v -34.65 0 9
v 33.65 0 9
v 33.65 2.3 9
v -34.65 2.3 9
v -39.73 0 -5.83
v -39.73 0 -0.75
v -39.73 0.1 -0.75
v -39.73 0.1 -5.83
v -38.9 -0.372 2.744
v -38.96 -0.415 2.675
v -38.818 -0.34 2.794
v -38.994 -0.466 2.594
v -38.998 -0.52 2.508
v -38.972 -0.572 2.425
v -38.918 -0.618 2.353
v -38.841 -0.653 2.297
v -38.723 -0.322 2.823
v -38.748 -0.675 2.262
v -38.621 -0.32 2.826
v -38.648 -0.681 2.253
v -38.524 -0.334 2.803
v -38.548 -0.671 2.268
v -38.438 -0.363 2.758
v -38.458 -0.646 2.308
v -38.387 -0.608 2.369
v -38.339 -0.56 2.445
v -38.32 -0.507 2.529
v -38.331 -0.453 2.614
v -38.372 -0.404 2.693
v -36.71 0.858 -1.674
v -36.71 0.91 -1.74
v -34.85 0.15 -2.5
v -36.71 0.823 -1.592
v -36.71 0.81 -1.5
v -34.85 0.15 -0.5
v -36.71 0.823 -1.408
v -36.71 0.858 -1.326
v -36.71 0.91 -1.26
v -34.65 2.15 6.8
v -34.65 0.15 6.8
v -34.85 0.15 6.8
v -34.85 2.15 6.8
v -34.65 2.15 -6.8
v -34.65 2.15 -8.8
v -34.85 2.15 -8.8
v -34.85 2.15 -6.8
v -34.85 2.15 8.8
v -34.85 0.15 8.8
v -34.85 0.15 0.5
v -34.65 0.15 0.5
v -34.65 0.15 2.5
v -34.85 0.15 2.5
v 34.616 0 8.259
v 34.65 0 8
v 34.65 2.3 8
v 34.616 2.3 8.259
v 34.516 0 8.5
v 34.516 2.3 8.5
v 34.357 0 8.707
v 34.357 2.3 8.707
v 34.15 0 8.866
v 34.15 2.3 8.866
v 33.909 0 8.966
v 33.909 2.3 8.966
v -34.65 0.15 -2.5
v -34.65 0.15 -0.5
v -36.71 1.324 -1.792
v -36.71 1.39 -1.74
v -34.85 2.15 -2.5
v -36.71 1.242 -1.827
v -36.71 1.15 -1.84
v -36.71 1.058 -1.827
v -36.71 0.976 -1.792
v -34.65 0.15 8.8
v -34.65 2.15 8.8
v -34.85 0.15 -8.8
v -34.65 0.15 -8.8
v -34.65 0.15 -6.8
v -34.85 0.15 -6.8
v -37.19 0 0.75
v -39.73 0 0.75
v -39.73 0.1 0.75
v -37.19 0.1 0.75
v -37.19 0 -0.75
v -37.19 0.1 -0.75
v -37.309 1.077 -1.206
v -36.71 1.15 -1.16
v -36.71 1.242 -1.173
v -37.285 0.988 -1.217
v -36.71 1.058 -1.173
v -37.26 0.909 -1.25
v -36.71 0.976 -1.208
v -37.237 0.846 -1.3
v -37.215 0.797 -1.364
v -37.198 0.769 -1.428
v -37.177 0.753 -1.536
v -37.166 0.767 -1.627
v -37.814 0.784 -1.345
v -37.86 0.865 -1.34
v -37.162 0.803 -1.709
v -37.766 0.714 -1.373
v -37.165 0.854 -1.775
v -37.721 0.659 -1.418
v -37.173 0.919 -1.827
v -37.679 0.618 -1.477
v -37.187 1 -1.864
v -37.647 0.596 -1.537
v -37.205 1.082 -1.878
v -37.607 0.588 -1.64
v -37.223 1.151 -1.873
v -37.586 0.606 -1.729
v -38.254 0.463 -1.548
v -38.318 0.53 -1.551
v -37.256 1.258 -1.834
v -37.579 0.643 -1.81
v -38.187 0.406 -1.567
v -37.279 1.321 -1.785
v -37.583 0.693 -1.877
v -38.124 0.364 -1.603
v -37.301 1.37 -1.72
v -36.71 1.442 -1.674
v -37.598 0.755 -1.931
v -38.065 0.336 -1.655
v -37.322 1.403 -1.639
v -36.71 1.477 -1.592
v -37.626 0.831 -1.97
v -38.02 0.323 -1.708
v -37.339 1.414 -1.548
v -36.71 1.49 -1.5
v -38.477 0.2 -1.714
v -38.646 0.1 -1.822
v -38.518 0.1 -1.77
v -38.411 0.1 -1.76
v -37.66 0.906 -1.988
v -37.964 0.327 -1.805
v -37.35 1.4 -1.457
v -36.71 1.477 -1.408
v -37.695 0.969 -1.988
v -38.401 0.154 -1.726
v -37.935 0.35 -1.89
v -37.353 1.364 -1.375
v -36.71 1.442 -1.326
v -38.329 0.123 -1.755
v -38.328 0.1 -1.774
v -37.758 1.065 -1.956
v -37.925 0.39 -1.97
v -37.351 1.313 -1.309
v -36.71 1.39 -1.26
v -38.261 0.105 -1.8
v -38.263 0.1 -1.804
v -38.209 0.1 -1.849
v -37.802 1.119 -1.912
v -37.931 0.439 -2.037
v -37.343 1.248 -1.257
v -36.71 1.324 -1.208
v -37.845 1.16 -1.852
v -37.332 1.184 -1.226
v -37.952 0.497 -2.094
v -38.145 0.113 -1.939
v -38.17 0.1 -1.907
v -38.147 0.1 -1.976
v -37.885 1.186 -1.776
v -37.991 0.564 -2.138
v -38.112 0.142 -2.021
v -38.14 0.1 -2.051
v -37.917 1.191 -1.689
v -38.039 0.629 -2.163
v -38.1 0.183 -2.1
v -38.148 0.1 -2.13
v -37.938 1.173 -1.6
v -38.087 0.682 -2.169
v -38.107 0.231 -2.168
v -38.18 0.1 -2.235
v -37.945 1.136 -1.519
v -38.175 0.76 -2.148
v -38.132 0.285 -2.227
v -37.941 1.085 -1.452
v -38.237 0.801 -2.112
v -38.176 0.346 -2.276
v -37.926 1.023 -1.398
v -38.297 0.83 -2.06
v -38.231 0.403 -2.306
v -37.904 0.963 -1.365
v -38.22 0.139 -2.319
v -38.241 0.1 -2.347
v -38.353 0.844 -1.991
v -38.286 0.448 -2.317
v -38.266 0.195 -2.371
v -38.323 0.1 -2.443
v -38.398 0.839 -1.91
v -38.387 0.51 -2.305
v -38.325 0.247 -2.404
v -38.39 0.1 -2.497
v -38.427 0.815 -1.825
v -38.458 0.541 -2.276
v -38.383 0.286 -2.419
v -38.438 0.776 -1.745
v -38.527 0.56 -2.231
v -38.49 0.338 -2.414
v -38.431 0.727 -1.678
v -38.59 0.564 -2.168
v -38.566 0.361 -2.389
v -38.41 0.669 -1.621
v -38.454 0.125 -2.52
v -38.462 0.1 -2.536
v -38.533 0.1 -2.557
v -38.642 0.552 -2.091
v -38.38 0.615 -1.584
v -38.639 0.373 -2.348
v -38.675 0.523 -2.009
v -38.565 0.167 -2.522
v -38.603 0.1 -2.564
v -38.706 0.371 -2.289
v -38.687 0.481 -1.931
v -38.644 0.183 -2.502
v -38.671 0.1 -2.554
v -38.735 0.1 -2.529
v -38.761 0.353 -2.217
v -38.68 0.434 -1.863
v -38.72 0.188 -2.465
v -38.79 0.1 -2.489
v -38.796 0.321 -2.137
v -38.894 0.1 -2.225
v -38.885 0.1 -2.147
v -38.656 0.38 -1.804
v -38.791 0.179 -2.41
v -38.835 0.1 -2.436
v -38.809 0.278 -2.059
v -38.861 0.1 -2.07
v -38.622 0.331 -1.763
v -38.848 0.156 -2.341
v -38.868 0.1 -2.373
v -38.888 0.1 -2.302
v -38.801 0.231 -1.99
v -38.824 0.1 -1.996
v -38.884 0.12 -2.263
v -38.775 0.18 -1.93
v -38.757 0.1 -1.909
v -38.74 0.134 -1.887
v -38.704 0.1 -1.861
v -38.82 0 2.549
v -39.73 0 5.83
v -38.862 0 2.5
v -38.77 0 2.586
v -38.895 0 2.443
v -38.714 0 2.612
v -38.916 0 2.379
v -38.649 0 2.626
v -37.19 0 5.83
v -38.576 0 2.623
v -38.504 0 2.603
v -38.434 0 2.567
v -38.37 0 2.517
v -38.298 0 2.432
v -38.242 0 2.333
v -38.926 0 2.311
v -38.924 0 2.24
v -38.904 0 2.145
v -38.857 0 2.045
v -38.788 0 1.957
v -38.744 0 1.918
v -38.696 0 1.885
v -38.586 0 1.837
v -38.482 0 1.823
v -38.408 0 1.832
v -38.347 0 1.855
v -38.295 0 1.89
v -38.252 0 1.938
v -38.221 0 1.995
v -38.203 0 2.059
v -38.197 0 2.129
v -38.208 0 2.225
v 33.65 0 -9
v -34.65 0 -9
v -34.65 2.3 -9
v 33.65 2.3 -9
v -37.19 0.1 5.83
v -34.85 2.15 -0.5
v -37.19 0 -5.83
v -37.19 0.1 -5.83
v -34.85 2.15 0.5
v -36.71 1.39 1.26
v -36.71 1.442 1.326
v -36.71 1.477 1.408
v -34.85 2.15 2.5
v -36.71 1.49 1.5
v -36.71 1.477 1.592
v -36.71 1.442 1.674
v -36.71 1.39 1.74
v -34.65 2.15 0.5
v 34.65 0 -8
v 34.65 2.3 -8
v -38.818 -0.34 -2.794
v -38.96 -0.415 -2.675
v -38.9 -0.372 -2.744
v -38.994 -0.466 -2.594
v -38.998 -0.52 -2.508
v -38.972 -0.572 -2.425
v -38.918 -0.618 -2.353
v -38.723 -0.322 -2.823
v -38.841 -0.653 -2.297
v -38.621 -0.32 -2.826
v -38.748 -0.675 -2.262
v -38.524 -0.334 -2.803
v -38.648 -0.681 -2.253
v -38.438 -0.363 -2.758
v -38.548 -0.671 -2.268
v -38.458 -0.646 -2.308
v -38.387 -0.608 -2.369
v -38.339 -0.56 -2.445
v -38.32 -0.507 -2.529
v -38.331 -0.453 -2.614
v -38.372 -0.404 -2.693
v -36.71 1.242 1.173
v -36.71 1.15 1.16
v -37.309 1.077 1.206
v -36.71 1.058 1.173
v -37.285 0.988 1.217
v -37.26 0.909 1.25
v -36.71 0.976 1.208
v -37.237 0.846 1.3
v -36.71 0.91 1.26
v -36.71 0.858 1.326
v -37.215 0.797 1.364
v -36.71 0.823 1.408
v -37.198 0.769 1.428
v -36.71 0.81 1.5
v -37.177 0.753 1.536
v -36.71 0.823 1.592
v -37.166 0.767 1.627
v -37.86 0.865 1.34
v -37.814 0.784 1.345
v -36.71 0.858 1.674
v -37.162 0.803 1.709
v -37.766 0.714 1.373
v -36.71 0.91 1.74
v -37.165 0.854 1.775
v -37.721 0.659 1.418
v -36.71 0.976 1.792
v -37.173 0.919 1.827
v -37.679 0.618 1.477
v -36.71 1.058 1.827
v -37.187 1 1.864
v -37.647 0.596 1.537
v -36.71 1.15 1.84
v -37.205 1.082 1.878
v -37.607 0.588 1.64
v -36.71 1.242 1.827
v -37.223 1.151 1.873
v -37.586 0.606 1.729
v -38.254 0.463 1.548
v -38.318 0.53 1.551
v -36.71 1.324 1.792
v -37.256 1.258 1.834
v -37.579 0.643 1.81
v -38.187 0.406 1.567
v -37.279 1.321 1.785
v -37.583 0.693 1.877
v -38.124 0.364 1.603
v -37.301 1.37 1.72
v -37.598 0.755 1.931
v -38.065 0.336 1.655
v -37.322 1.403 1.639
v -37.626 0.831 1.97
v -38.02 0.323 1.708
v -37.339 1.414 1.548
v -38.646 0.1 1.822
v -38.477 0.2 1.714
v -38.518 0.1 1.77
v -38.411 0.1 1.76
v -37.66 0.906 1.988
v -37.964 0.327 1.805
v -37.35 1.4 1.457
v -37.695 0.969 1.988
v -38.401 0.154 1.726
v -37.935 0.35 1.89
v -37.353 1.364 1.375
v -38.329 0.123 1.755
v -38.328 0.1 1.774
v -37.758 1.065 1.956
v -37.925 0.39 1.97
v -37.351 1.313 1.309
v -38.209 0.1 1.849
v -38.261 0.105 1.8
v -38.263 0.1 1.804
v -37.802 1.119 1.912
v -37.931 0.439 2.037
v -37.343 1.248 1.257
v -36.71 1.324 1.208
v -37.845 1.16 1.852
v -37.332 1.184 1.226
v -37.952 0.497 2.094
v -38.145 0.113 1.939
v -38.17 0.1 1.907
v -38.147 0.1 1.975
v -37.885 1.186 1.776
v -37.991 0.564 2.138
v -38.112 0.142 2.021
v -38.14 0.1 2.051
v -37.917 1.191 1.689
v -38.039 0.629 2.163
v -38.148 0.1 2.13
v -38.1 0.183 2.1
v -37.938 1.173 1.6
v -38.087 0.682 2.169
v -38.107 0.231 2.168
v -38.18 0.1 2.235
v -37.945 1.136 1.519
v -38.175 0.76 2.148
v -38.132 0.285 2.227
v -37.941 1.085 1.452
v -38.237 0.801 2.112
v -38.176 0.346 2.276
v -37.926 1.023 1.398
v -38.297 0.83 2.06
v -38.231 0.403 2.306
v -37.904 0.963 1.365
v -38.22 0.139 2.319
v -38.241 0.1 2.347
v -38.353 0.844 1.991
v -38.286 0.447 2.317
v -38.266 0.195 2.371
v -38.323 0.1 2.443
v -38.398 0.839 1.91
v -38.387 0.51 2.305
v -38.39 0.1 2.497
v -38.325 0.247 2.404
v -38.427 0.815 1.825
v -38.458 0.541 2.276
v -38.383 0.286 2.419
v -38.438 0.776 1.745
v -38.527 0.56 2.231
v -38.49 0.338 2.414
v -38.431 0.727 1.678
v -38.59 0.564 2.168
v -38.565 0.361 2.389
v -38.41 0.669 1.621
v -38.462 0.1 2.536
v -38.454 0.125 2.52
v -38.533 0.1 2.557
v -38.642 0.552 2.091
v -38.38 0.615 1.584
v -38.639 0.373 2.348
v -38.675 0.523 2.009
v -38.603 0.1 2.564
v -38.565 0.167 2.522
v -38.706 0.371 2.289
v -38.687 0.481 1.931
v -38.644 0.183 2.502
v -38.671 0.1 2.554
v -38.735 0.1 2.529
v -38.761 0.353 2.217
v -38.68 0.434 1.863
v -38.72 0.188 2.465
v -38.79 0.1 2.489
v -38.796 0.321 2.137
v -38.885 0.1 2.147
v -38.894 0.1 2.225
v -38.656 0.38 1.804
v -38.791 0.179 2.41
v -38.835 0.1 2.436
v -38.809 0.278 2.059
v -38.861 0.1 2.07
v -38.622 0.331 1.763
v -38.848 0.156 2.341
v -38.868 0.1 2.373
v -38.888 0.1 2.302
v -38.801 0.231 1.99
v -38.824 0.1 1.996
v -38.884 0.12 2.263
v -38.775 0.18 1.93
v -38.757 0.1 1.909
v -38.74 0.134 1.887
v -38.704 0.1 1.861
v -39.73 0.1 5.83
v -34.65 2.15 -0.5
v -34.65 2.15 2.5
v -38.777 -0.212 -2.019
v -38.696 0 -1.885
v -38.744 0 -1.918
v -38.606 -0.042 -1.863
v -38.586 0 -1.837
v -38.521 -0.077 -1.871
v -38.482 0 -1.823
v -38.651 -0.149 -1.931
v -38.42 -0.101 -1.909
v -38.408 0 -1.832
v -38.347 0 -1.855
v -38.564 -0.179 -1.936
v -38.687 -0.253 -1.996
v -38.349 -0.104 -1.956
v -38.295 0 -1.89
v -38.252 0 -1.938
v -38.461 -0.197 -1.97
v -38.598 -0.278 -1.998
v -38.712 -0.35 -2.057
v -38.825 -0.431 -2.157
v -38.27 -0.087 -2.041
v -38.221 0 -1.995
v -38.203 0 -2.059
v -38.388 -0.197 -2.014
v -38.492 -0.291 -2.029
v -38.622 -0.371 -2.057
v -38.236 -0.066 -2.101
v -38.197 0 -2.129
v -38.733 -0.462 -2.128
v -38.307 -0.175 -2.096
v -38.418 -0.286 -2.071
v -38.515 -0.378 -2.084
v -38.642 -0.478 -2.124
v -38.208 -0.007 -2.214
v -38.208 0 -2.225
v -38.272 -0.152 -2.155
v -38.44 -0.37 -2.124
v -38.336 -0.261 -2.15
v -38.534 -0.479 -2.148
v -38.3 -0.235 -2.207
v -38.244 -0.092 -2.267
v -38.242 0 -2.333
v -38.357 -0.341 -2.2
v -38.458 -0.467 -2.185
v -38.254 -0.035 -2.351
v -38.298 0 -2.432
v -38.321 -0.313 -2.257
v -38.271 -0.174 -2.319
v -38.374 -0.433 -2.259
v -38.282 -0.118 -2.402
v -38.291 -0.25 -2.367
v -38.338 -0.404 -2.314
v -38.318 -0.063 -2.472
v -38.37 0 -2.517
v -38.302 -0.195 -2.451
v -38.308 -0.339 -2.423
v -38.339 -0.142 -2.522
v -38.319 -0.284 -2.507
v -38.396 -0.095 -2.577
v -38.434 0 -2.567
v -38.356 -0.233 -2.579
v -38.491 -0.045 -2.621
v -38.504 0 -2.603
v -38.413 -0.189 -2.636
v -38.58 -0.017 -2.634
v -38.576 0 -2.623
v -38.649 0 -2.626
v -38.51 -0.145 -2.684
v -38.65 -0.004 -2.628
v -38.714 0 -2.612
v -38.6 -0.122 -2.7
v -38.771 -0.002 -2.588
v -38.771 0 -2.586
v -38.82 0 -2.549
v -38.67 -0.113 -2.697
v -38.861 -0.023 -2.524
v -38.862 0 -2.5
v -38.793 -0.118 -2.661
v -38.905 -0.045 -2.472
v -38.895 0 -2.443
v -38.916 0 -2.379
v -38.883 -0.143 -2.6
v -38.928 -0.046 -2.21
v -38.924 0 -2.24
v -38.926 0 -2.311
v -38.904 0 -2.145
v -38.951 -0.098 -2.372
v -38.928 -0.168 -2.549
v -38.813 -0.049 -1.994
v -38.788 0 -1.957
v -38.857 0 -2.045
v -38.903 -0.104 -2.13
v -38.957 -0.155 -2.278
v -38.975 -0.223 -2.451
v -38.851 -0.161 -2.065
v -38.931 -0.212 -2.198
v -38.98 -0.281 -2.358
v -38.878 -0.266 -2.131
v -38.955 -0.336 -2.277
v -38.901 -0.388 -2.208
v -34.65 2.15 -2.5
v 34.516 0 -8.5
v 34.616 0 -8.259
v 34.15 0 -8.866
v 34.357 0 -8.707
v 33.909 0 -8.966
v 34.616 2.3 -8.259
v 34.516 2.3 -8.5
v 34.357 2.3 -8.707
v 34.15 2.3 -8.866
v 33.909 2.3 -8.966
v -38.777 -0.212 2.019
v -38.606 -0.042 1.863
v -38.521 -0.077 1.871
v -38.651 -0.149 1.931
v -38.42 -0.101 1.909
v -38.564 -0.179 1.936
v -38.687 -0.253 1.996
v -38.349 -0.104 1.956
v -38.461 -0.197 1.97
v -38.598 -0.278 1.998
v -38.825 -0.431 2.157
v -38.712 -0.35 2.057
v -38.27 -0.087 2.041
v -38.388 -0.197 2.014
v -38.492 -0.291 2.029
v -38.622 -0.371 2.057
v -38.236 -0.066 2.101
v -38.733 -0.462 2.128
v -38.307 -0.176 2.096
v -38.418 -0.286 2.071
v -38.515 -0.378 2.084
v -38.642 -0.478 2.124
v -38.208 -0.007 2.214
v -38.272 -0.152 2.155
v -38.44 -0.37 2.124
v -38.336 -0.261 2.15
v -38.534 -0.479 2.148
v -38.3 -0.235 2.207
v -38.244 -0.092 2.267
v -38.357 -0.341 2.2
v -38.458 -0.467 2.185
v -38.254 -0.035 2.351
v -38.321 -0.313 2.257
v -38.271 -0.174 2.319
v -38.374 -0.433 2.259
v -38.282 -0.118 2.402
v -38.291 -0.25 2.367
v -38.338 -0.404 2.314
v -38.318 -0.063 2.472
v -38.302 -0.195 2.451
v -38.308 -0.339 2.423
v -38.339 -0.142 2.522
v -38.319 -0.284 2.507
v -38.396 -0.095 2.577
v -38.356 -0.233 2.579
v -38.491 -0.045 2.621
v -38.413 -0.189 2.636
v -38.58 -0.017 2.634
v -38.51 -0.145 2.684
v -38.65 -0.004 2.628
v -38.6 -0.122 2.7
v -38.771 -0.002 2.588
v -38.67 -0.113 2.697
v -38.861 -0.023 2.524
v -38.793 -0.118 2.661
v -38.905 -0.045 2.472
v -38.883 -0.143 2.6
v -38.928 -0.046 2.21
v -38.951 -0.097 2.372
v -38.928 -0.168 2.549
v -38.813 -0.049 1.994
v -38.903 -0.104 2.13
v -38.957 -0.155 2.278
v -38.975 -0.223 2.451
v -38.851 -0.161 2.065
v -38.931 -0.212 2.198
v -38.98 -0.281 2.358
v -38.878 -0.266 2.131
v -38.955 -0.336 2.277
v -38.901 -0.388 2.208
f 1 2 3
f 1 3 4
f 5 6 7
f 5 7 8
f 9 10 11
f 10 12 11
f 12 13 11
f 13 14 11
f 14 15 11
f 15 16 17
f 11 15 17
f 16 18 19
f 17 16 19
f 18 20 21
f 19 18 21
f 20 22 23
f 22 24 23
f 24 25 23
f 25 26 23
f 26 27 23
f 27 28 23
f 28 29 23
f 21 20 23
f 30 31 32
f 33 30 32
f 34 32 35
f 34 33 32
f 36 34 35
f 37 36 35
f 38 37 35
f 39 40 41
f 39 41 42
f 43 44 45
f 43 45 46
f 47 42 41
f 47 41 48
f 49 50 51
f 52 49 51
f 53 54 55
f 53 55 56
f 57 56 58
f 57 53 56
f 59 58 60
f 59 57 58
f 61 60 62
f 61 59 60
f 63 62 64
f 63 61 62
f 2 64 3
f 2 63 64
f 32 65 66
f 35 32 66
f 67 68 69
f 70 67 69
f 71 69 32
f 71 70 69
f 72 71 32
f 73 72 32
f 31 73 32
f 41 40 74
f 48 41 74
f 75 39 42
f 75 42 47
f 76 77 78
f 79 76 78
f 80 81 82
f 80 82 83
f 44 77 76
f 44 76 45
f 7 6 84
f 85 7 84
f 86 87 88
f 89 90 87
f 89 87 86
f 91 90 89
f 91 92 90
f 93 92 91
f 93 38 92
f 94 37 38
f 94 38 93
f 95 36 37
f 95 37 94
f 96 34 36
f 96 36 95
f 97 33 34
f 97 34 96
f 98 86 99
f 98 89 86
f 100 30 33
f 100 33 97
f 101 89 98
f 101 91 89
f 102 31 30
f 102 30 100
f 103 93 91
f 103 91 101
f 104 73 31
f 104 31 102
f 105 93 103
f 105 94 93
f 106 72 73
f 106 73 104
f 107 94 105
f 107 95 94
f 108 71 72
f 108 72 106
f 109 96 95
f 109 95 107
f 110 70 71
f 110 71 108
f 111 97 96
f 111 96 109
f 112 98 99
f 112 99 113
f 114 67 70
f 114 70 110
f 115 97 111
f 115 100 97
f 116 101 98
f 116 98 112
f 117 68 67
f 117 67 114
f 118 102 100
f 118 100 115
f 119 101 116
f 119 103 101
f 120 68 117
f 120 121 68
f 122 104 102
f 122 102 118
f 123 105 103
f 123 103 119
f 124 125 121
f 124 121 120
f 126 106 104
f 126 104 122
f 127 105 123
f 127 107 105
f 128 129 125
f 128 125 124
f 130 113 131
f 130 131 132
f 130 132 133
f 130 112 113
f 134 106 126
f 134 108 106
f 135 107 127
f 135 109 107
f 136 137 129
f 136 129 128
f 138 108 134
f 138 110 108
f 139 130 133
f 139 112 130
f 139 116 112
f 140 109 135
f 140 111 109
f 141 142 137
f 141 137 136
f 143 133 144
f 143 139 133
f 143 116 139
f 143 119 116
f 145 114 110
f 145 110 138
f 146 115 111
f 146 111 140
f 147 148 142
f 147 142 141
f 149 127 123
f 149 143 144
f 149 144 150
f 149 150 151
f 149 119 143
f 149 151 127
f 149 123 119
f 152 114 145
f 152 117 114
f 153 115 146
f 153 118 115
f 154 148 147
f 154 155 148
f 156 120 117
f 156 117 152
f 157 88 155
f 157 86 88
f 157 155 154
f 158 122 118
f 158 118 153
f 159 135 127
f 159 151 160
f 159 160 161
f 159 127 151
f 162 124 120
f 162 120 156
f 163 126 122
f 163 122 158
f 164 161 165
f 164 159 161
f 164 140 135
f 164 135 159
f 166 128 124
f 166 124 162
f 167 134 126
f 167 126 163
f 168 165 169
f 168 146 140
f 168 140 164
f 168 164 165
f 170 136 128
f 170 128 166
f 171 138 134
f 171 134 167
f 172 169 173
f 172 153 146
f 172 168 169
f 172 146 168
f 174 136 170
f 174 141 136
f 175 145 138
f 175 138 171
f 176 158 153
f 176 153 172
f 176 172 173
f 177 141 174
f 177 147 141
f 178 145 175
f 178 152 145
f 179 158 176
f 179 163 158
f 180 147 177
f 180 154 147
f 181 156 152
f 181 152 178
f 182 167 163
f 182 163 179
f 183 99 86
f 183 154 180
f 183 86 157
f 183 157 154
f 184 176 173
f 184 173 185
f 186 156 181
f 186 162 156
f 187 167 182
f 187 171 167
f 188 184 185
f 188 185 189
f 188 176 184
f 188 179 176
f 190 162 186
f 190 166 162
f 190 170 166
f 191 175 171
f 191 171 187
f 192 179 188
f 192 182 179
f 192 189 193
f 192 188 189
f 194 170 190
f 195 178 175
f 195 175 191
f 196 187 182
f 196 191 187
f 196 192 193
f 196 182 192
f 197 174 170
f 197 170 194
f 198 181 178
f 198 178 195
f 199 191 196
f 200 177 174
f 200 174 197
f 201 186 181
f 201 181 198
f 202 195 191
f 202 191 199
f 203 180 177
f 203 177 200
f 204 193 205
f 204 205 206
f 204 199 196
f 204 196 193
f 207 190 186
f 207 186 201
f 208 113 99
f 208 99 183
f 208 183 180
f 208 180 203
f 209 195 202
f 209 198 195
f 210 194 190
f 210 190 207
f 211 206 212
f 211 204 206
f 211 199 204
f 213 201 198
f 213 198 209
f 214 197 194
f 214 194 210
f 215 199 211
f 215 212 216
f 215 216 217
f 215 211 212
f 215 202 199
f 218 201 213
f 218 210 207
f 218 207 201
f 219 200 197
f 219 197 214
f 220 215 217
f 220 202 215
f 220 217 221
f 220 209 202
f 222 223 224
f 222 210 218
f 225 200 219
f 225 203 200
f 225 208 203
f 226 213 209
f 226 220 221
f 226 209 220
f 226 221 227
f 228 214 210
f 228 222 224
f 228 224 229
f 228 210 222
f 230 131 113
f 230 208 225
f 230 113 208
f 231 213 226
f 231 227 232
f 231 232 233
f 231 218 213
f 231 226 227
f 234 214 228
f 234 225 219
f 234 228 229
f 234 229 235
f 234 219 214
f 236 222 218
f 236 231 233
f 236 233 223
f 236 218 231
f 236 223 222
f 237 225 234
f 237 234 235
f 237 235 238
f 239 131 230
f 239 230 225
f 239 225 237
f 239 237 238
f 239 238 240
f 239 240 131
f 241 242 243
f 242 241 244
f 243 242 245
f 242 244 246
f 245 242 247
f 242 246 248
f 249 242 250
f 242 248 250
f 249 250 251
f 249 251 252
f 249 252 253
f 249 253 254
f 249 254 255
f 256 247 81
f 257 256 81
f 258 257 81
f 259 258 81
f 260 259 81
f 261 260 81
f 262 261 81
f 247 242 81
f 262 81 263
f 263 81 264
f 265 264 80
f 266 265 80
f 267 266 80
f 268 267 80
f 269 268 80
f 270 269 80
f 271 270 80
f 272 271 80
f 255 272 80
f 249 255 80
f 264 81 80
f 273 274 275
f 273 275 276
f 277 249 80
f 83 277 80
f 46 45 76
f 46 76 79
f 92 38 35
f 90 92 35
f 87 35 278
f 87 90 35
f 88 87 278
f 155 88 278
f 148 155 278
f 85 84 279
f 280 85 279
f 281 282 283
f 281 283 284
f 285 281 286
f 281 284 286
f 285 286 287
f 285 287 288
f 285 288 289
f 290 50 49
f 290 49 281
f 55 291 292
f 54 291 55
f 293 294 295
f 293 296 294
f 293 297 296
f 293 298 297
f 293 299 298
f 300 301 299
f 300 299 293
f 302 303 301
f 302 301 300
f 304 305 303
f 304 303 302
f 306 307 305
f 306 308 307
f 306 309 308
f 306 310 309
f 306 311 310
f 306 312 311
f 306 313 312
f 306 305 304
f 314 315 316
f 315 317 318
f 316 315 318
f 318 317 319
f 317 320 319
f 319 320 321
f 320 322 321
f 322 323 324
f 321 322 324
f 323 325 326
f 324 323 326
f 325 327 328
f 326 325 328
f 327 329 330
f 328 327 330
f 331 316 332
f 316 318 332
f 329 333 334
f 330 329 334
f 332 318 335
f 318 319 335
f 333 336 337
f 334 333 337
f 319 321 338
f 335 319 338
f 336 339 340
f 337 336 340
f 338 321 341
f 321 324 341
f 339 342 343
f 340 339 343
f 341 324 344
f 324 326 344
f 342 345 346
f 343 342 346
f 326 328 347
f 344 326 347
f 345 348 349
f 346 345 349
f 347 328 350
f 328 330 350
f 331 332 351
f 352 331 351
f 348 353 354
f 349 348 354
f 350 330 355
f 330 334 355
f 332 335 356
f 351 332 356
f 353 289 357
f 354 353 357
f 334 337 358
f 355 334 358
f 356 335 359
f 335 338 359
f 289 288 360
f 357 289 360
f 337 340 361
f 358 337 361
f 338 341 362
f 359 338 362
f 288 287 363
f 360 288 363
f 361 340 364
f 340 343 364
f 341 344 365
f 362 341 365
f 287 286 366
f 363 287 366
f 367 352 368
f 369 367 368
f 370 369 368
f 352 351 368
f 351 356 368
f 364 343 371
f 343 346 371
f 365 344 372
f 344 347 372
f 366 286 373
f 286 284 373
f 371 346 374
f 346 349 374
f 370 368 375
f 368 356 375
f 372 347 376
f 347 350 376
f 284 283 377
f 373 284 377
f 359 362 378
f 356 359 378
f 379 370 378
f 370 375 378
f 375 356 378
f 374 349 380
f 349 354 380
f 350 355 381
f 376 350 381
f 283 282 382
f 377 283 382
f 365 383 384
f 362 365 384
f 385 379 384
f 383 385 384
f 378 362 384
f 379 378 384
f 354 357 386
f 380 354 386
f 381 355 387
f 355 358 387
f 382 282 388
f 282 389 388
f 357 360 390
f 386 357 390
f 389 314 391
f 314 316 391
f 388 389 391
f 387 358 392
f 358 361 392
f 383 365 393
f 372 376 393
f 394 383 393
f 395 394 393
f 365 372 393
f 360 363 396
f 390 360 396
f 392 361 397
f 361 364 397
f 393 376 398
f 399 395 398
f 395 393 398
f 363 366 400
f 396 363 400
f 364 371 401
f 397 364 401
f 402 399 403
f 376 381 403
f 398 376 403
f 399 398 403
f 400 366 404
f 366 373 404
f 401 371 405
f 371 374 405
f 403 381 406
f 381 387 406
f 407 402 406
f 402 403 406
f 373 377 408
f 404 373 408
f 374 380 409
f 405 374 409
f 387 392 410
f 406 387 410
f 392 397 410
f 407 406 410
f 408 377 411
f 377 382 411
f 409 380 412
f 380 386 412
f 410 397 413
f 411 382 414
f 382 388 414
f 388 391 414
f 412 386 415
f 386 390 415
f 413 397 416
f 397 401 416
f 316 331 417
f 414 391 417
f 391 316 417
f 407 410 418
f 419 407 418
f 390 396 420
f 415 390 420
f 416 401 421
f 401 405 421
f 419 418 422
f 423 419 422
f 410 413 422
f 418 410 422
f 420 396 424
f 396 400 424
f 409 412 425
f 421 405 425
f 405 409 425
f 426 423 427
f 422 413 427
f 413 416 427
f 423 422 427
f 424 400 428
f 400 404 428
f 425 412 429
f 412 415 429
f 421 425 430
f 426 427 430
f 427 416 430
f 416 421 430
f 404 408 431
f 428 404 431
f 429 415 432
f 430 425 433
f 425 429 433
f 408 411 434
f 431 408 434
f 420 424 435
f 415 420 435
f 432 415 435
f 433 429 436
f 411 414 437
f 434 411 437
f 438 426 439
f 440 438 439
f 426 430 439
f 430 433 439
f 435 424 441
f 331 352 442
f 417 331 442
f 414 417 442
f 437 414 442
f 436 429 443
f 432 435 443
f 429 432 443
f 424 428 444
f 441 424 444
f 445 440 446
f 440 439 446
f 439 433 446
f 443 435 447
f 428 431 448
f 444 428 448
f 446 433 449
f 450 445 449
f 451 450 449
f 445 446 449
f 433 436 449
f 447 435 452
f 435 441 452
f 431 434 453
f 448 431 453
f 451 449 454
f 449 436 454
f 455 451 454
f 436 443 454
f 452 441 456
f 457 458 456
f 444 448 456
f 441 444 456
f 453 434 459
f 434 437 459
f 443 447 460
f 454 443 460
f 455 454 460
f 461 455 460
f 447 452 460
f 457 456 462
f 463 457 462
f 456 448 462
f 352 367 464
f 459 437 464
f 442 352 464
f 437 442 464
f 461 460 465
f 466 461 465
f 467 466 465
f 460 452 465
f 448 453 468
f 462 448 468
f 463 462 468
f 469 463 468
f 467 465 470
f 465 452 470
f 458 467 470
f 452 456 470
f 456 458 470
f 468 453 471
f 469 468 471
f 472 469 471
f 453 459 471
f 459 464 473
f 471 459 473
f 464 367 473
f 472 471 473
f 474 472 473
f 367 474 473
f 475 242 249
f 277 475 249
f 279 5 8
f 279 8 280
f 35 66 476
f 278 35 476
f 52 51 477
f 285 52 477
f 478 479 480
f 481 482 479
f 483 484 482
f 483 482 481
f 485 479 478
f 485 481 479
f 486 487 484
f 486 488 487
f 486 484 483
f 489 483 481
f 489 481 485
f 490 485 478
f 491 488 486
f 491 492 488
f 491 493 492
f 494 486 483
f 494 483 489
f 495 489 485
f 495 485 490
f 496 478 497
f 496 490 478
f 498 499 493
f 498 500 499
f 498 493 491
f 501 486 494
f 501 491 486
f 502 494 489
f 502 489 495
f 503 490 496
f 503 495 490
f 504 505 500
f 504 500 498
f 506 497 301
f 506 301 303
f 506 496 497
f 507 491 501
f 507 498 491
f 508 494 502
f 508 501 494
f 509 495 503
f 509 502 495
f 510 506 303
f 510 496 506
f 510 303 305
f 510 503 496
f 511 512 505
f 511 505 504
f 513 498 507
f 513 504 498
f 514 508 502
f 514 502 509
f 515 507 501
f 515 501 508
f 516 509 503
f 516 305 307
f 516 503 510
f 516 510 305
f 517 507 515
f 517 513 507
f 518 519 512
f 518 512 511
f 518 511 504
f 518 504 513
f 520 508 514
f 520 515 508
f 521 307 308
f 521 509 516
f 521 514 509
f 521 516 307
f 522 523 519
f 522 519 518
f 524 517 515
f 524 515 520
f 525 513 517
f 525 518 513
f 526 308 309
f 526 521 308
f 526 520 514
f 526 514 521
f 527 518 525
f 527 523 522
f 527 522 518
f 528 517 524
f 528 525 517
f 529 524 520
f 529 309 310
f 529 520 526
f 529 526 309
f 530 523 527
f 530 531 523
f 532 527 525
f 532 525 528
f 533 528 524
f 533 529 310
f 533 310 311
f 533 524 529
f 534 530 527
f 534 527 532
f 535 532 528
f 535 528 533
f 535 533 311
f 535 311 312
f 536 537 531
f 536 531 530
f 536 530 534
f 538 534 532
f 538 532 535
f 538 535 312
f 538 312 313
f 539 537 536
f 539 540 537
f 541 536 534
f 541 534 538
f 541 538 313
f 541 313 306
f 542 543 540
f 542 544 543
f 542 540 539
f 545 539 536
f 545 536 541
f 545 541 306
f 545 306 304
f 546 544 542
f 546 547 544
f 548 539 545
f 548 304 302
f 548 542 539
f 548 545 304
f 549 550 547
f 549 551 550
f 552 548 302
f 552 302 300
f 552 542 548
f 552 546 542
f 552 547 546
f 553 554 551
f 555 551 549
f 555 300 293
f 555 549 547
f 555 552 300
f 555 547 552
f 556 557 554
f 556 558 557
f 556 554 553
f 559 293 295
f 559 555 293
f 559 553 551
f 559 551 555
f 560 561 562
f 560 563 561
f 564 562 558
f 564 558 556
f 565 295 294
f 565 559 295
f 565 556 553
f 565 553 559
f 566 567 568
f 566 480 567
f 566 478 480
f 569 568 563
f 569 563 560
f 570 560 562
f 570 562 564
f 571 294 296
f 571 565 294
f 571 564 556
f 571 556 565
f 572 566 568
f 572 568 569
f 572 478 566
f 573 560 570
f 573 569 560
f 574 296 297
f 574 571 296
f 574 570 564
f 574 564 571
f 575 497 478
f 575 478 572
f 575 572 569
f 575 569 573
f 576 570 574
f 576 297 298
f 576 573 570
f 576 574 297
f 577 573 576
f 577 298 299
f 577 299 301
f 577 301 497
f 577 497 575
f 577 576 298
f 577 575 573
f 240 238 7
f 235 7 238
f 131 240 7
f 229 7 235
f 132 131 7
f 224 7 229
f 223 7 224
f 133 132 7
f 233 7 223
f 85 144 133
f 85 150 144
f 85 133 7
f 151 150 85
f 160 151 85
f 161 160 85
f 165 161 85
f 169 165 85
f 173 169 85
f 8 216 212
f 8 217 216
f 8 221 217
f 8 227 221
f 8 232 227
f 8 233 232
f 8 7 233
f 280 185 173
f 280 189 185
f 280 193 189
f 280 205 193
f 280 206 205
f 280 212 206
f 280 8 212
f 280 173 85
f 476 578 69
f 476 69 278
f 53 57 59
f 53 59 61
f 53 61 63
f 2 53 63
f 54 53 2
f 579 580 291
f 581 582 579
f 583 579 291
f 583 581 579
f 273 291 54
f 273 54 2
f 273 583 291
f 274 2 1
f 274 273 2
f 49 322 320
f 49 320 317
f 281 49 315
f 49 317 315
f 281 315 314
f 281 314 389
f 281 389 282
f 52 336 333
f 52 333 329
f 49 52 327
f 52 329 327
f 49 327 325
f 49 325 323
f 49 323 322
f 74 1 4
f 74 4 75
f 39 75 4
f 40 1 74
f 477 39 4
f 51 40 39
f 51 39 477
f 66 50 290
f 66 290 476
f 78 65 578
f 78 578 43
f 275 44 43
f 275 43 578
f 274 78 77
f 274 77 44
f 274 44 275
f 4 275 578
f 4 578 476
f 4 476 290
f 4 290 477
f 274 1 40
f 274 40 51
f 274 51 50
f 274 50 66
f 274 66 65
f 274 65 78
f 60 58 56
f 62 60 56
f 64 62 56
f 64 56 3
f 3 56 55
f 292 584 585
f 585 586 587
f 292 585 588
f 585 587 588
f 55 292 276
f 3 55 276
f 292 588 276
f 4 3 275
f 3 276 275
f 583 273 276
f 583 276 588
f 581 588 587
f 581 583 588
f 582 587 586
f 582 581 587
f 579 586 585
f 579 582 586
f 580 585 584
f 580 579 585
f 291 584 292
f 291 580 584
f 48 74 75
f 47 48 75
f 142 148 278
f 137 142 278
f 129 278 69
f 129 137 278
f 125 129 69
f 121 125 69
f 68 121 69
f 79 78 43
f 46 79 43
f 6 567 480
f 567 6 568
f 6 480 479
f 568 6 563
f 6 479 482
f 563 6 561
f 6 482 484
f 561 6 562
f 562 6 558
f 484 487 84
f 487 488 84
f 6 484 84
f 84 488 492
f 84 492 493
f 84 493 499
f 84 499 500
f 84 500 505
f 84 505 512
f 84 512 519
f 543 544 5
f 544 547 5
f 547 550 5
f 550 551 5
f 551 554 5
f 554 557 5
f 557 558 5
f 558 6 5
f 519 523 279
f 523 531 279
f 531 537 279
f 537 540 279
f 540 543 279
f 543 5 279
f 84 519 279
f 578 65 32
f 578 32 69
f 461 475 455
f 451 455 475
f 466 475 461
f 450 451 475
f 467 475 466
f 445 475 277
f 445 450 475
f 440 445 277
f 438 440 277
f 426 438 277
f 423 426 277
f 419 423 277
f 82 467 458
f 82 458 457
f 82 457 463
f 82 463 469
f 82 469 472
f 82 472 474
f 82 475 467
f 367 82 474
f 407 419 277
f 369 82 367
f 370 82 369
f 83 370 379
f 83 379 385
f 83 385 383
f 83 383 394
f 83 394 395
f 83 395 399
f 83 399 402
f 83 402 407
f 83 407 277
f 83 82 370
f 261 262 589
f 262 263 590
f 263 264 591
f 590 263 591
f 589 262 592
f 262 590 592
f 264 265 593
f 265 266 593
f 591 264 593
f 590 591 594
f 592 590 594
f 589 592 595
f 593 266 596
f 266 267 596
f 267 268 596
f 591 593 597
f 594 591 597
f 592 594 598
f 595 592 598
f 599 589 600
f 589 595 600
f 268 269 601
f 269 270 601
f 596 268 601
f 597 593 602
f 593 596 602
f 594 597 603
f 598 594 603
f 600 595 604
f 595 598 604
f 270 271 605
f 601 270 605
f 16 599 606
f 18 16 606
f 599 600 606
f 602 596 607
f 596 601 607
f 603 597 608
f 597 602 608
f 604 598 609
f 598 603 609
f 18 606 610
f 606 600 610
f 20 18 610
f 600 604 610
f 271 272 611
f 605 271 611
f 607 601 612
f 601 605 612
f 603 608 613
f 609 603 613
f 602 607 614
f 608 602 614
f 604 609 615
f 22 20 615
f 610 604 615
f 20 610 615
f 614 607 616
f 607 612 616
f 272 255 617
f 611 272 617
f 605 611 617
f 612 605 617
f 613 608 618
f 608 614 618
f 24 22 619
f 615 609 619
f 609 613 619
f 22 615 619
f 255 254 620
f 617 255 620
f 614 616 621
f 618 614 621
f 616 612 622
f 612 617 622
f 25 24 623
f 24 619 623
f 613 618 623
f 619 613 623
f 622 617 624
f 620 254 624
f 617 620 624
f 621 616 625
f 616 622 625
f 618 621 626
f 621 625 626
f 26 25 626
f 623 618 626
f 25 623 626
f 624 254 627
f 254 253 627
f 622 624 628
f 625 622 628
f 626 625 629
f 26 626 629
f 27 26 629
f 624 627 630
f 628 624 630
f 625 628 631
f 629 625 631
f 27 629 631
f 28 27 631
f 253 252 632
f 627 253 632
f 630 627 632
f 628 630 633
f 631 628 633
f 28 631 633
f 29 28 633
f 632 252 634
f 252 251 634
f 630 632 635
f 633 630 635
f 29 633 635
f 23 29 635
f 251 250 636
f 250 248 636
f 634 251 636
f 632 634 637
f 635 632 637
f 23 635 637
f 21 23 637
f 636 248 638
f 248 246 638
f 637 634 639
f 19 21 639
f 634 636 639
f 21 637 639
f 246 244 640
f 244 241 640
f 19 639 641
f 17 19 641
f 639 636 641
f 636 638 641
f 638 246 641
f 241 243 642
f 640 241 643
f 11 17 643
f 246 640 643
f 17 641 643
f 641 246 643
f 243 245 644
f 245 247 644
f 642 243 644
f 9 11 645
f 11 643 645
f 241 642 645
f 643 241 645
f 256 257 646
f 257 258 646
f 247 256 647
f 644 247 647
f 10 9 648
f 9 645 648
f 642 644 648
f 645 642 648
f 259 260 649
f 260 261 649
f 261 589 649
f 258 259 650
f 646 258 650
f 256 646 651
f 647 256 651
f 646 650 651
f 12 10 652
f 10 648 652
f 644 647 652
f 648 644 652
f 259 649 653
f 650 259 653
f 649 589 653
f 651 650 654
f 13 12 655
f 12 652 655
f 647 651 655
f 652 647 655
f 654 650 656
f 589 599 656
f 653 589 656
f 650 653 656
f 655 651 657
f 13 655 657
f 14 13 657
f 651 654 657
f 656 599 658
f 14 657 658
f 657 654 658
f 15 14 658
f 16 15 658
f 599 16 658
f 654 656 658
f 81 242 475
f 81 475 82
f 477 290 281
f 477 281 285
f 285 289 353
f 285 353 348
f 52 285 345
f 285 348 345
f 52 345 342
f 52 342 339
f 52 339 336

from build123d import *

# Parameters (mm, degrees)
BOSS_EXTRUDE1_DEPTH = 2.3
SKETCH2_W           = 2
SKETCH2_H           = 2
BOSS_EXTRUDE2_DEPTH = 0.2
SKETCH6_W           = 2
SKETCH6_H           = 2
SKETCH4_R           = 0.34
SKETCH7_W           = 2.54
SKETCH7_H           = 5.08
BOSS_EXTRUDE3_DEPTH = 0.1


with BuildPart() as part:
    # Sketch1 → Boss-Extrude1 (new body)
    with BuildSketch(Plane(origin=(0, 0, 0), x_dir=(1, 0, 0), z_dir=(0, 1, 0))):
        with BuildLine():
            Line((-34.65, 9), (33.65, 9))
            ThreePointArc((33.65, 9), (34.357106781, 8.707106781), (34.65, 8))
            Line((34.65, 8), (34.65, -8))
            ThreePointArc((34.65, -8), (34.357106781, -8.707106781), (33.65, -9))
            Line((33.65, -9), (-34.65, -9))
            Line((-34.65, -9), (-34.65, 9))
        make_face()
    extrude(amount=BOSS_EXTRUDE1_DEPTH)

    # Sketch2 → Boss-Extrude2 (add)
    with BuildSketch(Plane.ZY.offset(34.65)):
        with Locations((-7.8, 1.15)):
            Rectangle(SKETCH2_W, SKETCH2_H)
        with Locations((-1.5, 1.15)):
            Rectangle(SKETCH2_W, SKETCH2_H)
        with Locations((1.5, 1.15)):
            Rectangle(SKETCH2_W, SKETCH2_H)
        with Locations((7.8, 1.15)):
            Rectangle(SKETCH2_W, SKETCH2_H)
    extrude(amount=BOSS_EXTRUDE2_DEPTH)

    # Sketch6 → Loft1 section 0
    with BuildSketch(Plane.ZY.offset(34.85)):
        with Locations((-1.5, 1.15)):
            Rectangle(SKETCH6_W, SKETCH6_H)
    # Sketch5 for Loft1 → Loft1 section 1
    with BuildSketch(Plane(origin=(-36.709589787, 1.15, -1.5), x_dir=(0, 0, 1), z_dir=(-1, 0, 0))):
        with BuildLine():
            # circular arc as an exact rational Bezier (weights 1, cos(half-angle), 1)
            Bezier((-0.240416306, 0.240416306), (0, 0.48083261), (0.240416306, 0.240416306), weights=[1, 0.707106784, 1])
            Bezier((0.240416306, 0.240416306), (0.48083261, 0), (0.240416306, -0.240416306), weights=[1, 0.707106784, 1])
            Bezier((0.240416306, -0.240416306), (0, -0.48083261), (-0.240416306, -0.240416306), weights=[1, 0.707106784, 1])
            Bezier((-0.240416306, -0.240416306), (-0.48083261, 0), (-0.240416306, 0.240416306), weights=[1, 0.707106784, 1])
        make_face()
    loft1 = loft()

    # Sweep2: sweep along a curve in space
    with BuildLine() as sweep2_path:
        Line((-34.85, 1.15, -1.5), (-36.709589787, 1.15, -1.5))
        ThreePointArc((-36.709589787, 1.15, -1.5), (-38.088738075, 0.666726189, -1.804608948), (-38.66, -0.5, -2.54))
    # Sketch4 → Sweep2 (sweep)
    with BuildSketch(Plane.ZY.offset(34.85)):
        with Locations((-1.5, 1.15)):
            Circle(SKETCH4_R)
    sweep2 = sweep(path=sweep2_path.line)

    # Mirror4: Loft1, Sweep2 across plane
    add(loft1.mirror(Plane.XY))
    add(sweep2.mirror(Plane.XY))

    # Sketch7 → Boss-Extrude3 (add)
    with BuildSketch(Plane(origin=(0, 0, 0), x_dir=(1, 0, 0), z_dir=(0, 1, 0))):
        with Locations((-38.46, 3.29)):
            Rectangle(SKETCH7_W, SKETCH7_H)
        with Locations((-38.46, -3.29)):
            Rectangle(SKETCH7_W, SKETCH7_H)
    extrude(amount=BOSS_EXTRUDE3_DEPTH)


solid = part.part
